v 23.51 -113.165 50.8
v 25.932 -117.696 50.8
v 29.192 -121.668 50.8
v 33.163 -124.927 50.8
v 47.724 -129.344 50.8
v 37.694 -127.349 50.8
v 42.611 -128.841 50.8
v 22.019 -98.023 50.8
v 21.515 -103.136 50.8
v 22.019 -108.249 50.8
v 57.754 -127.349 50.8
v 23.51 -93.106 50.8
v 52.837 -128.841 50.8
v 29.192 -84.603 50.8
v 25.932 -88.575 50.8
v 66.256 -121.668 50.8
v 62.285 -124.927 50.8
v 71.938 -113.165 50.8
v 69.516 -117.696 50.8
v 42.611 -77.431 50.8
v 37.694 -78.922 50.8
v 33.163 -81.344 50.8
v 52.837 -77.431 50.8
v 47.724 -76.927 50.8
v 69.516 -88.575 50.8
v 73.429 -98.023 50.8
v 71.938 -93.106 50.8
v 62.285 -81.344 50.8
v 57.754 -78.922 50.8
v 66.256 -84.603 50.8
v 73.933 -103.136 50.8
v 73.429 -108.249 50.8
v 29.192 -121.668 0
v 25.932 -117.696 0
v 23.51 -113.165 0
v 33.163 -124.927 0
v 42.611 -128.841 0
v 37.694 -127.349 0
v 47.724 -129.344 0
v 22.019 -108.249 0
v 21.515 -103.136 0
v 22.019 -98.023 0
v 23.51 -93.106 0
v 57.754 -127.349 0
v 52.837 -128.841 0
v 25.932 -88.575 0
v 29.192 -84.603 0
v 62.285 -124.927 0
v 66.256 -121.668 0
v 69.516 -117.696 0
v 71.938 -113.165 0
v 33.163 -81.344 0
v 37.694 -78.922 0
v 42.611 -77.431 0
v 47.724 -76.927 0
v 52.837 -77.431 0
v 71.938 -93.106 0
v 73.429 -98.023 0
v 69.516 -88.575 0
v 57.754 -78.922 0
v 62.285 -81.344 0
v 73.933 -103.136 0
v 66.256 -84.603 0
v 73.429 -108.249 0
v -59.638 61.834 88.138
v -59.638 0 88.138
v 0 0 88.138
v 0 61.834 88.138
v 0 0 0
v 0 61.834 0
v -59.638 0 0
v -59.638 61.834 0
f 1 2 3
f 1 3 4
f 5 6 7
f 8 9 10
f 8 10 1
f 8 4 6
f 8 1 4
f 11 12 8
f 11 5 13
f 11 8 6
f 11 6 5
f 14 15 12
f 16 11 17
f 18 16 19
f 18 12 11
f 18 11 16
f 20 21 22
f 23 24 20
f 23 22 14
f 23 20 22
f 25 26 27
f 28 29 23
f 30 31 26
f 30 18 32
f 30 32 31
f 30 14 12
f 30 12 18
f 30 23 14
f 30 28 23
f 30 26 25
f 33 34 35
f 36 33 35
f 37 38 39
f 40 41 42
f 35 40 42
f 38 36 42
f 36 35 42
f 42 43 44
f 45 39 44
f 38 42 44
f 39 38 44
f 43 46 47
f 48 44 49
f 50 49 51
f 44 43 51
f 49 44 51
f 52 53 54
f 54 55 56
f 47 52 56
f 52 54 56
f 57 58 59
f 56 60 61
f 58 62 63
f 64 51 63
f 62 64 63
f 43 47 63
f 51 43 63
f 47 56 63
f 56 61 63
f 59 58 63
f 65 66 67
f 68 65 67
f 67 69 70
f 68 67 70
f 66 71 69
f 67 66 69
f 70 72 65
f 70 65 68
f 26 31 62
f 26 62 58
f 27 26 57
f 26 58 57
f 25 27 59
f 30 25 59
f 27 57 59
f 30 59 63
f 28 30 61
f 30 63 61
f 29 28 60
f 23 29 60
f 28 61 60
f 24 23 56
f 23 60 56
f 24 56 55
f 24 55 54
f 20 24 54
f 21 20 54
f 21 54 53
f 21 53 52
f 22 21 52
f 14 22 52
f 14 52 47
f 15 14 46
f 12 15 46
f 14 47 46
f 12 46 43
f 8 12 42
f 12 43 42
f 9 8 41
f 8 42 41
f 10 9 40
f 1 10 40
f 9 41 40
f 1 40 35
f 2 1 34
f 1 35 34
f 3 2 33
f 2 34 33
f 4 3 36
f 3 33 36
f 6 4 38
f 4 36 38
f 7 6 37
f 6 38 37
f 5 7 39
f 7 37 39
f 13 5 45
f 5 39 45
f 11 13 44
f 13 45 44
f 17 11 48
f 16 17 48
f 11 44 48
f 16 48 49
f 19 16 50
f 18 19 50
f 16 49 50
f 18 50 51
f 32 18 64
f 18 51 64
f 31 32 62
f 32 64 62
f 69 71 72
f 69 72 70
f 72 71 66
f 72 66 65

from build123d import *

# Parameters (mm, degrees)
F0_W      = 59.637699
F0_H      = 61.834071
F1_DEPTH  = 88.138
F2_R      = 26.208555
F3_DEPTH  = 25.4
F3_FACE_R = 26.208555
F4_DEPTH  = 25.4


with BuildPart() as f1:
    # F0 (on Top) → F1 (new body)
    with BuildSketch(Plane.XY):
        with Locations((-29.818849, 30.917035)):
            Rectangle(F0_W, F0_H)
    extrude(amount=F1_DEPTH)


with BuildPart() as f3:
    # F2 (on Top) → F3 (new body)
    with BuildSketch(Plane.XY):
        with Locations((47.724042, -103.13572)):
            Circle(F2_R)
    extrude(amount=F3_DEPTH)

    # F3_face (on face) → F4 (join)
    with BuildSketch(Plane(origin=(47.724042, -103.13572, 25.4), x_dir=(1, 0, 0), z_dir=(0, 0, 1))):
        Circle(F3_FACE_R)
    extrude(amount=F4_DEPTH)


solid = Compound([f1.part, f3.part])
